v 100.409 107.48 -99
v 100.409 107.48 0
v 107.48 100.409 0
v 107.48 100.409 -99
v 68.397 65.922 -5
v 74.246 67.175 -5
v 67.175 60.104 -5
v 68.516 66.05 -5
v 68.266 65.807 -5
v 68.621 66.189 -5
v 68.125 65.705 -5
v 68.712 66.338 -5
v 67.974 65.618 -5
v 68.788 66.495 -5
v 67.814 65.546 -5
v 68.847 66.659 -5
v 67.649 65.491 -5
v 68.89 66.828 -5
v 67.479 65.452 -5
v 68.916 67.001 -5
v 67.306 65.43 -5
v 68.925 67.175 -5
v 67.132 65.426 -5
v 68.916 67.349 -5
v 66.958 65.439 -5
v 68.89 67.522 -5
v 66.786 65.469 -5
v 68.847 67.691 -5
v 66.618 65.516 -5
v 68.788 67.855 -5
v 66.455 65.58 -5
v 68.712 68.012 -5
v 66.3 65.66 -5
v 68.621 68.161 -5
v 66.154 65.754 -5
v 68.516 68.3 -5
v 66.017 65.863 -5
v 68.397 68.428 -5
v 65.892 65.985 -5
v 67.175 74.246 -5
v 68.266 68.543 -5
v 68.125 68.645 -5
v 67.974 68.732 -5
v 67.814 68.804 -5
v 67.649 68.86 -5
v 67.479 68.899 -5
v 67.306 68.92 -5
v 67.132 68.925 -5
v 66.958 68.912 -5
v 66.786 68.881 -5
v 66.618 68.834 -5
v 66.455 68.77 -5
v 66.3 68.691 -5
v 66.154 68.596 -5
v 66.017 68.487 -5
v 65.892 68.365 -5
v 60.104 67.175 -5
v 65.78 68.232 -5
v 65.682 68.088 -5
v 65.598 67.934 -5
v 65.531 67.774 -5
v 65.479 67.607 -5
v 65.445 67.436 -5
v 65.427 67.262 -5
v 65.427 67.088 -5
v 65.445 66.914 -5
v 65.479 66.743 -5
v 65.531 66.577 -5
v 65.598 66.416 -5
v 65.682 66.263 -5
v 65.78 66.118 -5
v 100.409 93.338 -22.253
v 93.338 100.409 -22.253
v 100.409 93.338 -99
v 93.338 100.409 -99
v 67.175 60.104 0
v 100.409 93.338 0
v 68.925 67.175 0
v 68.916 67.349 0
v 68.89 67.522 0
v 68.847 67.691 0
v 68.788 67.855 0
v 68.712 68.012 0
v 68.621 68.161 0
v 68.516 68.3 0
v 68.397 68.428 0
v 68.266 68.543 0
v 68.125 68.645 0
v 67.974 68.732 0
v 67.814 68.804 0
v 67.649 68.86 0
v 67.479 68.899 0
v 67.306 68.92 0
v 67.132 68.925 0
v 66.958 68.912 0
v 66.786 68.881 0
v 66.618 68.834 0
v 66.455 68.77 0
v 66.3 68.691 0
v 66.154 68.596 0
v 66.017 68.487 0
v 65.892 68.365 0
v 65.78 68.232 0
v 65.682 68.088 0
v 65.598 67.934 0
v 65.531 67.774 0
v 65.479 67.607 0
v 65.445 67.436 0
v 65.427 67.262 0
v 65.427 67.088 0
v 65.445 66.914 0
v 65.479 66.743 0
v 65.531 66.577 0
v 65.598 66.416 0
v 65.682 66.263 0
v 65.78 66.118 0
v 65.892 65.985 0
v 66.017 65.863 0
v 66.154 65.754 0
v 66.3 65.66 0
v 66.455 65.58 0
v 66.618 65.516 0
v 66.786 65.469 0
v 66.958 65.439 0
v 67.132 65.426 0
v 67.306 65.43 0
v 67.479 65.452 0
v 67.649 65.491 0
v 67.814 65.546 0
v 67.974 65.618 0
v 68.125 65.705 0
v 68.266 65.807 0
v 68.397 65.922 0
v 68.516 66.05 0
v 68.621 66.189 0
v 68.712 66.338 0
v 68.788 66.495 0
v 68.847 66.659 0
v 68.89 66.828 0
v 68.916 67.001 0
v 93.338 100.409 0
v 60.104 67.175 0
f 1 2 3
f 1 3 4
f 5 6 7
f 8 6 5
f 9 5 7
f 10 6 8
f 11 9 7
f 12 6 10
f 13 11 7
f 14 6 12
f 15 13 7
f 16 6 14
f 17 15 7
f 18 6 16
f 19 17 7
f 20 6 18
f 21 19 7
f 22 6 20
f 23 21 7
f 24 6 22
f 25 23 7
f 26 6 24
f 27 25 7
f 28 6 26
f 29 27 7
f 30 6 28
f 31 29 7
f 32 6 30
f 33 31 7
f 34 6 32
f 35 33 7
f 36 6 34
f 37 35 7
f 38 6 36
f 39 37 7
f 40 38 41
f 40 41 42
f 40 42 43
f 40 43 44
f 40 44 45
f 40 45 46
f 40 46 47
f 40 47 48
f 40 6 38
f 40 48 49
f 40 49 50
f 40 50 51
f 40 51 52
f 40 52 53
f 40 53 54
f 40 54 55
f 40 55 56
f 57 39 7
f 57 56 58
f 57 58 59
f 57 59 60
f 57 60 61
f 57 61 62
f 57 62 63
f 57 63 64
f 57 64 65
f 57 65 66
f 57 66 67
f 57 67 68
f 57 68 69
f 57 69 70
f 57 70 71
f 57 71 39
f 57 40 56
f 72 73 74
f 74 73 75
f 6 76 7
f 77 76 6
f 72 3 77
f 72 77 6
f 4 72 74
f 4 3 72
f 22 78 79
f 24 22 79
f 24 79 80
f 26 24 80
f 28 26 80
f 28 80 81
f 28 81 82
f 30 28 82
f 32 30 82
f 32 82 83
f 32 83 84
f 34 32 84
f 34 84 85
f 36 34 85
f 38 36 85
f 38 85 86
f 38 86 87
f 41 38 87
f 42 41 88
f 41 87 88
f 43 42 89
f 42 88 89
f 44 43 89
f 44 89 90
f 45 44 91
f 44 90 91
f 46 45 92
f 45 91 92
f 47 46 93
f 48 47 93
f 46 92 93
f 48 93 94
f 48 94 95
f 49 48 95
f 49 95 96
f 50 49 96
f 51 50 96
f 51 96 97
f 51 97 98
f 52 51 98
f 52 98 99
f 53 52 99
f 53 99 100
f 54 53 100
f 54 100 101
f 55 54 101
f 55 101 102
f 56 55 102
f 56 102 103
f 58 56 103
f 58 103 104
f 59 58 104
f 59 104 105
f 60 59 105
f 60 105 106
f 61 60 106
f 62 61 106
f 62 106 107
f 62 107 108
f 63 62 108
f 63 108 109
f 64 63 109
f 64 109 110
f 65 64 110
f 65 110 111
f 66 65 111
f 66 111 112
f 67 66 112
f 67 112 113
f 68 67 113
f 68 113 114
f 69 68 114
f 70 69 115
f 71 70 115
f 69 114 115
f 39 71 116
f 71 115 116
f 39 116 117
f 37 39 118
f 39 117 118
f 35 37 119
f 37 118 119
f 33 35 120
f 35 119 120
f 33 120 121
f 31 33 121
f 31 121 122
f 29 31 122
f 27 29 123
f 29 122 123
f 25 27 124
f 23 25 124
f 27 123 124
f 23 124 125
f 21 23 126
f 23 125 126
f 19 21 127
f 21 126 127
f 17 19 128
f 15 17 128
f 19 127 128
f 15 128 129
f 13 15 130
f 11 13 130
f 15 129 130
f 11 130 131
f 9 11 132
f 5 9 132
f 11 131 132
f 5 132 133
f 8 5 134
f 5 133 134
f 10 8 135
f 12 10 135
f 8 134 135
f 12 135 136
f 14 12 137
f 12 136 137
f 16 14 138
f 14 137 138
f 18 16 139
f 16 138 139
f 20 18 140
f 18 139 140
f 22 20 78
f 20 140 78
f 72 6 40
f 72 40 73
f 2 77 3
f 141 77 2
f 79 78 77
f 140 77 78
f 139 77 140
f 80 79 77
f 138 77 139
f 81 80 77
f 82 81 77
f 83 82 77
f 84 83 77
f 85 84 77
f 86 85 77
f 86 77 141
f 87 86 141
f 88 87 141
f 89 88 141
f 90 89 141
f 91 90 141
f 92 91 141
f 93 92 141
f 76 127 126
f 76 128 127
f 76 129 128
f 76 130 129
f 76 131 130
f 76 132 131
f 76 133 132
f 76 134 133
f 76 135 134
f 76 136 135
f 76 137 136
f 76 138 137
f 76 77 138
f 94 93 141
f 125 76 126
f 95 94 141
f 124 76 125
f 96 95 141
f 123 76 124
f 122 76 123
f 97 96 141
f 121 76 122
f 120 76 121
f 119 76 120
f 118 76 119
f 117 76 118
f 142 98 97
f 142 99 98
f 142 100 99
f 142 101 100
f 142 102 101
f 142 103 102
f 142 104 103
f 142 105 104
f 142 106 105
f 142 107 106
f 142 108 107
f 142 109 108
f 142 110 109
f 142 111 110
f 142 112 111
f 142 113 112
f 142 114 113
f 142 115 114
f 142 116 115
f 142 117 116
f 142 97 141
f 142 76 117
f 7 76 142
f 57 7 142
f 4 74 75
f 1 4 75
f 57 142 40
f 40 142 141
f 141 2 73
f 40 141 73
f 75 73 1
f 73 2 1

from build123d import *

# Parameters (mm, degrees)
BOSS_EXTRUDE1_DEPTH = 5
SKETCH2_W           = 99
SKETCH2_H           = 10
BOSS_EXTRUDE2_DEPTH = 10
BOSS_EXTRUDE3_DEPTH = 10
SKETCH4_R           = 1.75
CUT_EXTRUDE1_DEPTH  = 100


with BuildPart() as part:
    # Sketch1 → Boss-Extrude1 (new body)
    with BuildSketch(Plane.XY):
        Polygon((67.175144213, 60.104076401), (60.104076401, 67.175144213), (93.338122667, 100.409190479), (100.409190479, 93.338122667), align=None)
    extrude(amount=-BOSS_EXTRUDE1_DEPTH)

    # Sketch2 → Boss-Extrude2 (add)
    with BuildSketch(Plane(origin=(96.873656573, 96.873656573, 0), x_dir=(0, 0, -1), z_dir=(0.707106781, 0.707106781, 0))):
        with Locations((49.5, 0)):
            Rectangle(SKETCH2_W, SKETCH2_H)
    extrude(amount=BOSS_EXTRUDE2_DEPTH)

    # Sketch3 → Boss-Extrude3 (add)
    with BuildSketch(Plane(origin=(3.535533906, -3.535533906, 0), x_dir=(0, 0, -1), z_dir=(0.707106781, -0.707106781, 0))):
        Polygon((5, 100), (22.25340152, 137.000038963), (5, 137.000038963), align=None)
    extrude(amount=-BOSS_EXTRUDE3_DEPTH)

    # Sketch4 → Cut-Extrude1 (cut, through all)
    with BuildSketch(Plane.XY):
        with Locations((67.175144213, 67.175144213)):
            Circle(SKETCH4_R)
    extrude(amount=-CUT_EXTRUDE1_DEPTH, mode=Mode.SUBTRACT)


solid = part.part
